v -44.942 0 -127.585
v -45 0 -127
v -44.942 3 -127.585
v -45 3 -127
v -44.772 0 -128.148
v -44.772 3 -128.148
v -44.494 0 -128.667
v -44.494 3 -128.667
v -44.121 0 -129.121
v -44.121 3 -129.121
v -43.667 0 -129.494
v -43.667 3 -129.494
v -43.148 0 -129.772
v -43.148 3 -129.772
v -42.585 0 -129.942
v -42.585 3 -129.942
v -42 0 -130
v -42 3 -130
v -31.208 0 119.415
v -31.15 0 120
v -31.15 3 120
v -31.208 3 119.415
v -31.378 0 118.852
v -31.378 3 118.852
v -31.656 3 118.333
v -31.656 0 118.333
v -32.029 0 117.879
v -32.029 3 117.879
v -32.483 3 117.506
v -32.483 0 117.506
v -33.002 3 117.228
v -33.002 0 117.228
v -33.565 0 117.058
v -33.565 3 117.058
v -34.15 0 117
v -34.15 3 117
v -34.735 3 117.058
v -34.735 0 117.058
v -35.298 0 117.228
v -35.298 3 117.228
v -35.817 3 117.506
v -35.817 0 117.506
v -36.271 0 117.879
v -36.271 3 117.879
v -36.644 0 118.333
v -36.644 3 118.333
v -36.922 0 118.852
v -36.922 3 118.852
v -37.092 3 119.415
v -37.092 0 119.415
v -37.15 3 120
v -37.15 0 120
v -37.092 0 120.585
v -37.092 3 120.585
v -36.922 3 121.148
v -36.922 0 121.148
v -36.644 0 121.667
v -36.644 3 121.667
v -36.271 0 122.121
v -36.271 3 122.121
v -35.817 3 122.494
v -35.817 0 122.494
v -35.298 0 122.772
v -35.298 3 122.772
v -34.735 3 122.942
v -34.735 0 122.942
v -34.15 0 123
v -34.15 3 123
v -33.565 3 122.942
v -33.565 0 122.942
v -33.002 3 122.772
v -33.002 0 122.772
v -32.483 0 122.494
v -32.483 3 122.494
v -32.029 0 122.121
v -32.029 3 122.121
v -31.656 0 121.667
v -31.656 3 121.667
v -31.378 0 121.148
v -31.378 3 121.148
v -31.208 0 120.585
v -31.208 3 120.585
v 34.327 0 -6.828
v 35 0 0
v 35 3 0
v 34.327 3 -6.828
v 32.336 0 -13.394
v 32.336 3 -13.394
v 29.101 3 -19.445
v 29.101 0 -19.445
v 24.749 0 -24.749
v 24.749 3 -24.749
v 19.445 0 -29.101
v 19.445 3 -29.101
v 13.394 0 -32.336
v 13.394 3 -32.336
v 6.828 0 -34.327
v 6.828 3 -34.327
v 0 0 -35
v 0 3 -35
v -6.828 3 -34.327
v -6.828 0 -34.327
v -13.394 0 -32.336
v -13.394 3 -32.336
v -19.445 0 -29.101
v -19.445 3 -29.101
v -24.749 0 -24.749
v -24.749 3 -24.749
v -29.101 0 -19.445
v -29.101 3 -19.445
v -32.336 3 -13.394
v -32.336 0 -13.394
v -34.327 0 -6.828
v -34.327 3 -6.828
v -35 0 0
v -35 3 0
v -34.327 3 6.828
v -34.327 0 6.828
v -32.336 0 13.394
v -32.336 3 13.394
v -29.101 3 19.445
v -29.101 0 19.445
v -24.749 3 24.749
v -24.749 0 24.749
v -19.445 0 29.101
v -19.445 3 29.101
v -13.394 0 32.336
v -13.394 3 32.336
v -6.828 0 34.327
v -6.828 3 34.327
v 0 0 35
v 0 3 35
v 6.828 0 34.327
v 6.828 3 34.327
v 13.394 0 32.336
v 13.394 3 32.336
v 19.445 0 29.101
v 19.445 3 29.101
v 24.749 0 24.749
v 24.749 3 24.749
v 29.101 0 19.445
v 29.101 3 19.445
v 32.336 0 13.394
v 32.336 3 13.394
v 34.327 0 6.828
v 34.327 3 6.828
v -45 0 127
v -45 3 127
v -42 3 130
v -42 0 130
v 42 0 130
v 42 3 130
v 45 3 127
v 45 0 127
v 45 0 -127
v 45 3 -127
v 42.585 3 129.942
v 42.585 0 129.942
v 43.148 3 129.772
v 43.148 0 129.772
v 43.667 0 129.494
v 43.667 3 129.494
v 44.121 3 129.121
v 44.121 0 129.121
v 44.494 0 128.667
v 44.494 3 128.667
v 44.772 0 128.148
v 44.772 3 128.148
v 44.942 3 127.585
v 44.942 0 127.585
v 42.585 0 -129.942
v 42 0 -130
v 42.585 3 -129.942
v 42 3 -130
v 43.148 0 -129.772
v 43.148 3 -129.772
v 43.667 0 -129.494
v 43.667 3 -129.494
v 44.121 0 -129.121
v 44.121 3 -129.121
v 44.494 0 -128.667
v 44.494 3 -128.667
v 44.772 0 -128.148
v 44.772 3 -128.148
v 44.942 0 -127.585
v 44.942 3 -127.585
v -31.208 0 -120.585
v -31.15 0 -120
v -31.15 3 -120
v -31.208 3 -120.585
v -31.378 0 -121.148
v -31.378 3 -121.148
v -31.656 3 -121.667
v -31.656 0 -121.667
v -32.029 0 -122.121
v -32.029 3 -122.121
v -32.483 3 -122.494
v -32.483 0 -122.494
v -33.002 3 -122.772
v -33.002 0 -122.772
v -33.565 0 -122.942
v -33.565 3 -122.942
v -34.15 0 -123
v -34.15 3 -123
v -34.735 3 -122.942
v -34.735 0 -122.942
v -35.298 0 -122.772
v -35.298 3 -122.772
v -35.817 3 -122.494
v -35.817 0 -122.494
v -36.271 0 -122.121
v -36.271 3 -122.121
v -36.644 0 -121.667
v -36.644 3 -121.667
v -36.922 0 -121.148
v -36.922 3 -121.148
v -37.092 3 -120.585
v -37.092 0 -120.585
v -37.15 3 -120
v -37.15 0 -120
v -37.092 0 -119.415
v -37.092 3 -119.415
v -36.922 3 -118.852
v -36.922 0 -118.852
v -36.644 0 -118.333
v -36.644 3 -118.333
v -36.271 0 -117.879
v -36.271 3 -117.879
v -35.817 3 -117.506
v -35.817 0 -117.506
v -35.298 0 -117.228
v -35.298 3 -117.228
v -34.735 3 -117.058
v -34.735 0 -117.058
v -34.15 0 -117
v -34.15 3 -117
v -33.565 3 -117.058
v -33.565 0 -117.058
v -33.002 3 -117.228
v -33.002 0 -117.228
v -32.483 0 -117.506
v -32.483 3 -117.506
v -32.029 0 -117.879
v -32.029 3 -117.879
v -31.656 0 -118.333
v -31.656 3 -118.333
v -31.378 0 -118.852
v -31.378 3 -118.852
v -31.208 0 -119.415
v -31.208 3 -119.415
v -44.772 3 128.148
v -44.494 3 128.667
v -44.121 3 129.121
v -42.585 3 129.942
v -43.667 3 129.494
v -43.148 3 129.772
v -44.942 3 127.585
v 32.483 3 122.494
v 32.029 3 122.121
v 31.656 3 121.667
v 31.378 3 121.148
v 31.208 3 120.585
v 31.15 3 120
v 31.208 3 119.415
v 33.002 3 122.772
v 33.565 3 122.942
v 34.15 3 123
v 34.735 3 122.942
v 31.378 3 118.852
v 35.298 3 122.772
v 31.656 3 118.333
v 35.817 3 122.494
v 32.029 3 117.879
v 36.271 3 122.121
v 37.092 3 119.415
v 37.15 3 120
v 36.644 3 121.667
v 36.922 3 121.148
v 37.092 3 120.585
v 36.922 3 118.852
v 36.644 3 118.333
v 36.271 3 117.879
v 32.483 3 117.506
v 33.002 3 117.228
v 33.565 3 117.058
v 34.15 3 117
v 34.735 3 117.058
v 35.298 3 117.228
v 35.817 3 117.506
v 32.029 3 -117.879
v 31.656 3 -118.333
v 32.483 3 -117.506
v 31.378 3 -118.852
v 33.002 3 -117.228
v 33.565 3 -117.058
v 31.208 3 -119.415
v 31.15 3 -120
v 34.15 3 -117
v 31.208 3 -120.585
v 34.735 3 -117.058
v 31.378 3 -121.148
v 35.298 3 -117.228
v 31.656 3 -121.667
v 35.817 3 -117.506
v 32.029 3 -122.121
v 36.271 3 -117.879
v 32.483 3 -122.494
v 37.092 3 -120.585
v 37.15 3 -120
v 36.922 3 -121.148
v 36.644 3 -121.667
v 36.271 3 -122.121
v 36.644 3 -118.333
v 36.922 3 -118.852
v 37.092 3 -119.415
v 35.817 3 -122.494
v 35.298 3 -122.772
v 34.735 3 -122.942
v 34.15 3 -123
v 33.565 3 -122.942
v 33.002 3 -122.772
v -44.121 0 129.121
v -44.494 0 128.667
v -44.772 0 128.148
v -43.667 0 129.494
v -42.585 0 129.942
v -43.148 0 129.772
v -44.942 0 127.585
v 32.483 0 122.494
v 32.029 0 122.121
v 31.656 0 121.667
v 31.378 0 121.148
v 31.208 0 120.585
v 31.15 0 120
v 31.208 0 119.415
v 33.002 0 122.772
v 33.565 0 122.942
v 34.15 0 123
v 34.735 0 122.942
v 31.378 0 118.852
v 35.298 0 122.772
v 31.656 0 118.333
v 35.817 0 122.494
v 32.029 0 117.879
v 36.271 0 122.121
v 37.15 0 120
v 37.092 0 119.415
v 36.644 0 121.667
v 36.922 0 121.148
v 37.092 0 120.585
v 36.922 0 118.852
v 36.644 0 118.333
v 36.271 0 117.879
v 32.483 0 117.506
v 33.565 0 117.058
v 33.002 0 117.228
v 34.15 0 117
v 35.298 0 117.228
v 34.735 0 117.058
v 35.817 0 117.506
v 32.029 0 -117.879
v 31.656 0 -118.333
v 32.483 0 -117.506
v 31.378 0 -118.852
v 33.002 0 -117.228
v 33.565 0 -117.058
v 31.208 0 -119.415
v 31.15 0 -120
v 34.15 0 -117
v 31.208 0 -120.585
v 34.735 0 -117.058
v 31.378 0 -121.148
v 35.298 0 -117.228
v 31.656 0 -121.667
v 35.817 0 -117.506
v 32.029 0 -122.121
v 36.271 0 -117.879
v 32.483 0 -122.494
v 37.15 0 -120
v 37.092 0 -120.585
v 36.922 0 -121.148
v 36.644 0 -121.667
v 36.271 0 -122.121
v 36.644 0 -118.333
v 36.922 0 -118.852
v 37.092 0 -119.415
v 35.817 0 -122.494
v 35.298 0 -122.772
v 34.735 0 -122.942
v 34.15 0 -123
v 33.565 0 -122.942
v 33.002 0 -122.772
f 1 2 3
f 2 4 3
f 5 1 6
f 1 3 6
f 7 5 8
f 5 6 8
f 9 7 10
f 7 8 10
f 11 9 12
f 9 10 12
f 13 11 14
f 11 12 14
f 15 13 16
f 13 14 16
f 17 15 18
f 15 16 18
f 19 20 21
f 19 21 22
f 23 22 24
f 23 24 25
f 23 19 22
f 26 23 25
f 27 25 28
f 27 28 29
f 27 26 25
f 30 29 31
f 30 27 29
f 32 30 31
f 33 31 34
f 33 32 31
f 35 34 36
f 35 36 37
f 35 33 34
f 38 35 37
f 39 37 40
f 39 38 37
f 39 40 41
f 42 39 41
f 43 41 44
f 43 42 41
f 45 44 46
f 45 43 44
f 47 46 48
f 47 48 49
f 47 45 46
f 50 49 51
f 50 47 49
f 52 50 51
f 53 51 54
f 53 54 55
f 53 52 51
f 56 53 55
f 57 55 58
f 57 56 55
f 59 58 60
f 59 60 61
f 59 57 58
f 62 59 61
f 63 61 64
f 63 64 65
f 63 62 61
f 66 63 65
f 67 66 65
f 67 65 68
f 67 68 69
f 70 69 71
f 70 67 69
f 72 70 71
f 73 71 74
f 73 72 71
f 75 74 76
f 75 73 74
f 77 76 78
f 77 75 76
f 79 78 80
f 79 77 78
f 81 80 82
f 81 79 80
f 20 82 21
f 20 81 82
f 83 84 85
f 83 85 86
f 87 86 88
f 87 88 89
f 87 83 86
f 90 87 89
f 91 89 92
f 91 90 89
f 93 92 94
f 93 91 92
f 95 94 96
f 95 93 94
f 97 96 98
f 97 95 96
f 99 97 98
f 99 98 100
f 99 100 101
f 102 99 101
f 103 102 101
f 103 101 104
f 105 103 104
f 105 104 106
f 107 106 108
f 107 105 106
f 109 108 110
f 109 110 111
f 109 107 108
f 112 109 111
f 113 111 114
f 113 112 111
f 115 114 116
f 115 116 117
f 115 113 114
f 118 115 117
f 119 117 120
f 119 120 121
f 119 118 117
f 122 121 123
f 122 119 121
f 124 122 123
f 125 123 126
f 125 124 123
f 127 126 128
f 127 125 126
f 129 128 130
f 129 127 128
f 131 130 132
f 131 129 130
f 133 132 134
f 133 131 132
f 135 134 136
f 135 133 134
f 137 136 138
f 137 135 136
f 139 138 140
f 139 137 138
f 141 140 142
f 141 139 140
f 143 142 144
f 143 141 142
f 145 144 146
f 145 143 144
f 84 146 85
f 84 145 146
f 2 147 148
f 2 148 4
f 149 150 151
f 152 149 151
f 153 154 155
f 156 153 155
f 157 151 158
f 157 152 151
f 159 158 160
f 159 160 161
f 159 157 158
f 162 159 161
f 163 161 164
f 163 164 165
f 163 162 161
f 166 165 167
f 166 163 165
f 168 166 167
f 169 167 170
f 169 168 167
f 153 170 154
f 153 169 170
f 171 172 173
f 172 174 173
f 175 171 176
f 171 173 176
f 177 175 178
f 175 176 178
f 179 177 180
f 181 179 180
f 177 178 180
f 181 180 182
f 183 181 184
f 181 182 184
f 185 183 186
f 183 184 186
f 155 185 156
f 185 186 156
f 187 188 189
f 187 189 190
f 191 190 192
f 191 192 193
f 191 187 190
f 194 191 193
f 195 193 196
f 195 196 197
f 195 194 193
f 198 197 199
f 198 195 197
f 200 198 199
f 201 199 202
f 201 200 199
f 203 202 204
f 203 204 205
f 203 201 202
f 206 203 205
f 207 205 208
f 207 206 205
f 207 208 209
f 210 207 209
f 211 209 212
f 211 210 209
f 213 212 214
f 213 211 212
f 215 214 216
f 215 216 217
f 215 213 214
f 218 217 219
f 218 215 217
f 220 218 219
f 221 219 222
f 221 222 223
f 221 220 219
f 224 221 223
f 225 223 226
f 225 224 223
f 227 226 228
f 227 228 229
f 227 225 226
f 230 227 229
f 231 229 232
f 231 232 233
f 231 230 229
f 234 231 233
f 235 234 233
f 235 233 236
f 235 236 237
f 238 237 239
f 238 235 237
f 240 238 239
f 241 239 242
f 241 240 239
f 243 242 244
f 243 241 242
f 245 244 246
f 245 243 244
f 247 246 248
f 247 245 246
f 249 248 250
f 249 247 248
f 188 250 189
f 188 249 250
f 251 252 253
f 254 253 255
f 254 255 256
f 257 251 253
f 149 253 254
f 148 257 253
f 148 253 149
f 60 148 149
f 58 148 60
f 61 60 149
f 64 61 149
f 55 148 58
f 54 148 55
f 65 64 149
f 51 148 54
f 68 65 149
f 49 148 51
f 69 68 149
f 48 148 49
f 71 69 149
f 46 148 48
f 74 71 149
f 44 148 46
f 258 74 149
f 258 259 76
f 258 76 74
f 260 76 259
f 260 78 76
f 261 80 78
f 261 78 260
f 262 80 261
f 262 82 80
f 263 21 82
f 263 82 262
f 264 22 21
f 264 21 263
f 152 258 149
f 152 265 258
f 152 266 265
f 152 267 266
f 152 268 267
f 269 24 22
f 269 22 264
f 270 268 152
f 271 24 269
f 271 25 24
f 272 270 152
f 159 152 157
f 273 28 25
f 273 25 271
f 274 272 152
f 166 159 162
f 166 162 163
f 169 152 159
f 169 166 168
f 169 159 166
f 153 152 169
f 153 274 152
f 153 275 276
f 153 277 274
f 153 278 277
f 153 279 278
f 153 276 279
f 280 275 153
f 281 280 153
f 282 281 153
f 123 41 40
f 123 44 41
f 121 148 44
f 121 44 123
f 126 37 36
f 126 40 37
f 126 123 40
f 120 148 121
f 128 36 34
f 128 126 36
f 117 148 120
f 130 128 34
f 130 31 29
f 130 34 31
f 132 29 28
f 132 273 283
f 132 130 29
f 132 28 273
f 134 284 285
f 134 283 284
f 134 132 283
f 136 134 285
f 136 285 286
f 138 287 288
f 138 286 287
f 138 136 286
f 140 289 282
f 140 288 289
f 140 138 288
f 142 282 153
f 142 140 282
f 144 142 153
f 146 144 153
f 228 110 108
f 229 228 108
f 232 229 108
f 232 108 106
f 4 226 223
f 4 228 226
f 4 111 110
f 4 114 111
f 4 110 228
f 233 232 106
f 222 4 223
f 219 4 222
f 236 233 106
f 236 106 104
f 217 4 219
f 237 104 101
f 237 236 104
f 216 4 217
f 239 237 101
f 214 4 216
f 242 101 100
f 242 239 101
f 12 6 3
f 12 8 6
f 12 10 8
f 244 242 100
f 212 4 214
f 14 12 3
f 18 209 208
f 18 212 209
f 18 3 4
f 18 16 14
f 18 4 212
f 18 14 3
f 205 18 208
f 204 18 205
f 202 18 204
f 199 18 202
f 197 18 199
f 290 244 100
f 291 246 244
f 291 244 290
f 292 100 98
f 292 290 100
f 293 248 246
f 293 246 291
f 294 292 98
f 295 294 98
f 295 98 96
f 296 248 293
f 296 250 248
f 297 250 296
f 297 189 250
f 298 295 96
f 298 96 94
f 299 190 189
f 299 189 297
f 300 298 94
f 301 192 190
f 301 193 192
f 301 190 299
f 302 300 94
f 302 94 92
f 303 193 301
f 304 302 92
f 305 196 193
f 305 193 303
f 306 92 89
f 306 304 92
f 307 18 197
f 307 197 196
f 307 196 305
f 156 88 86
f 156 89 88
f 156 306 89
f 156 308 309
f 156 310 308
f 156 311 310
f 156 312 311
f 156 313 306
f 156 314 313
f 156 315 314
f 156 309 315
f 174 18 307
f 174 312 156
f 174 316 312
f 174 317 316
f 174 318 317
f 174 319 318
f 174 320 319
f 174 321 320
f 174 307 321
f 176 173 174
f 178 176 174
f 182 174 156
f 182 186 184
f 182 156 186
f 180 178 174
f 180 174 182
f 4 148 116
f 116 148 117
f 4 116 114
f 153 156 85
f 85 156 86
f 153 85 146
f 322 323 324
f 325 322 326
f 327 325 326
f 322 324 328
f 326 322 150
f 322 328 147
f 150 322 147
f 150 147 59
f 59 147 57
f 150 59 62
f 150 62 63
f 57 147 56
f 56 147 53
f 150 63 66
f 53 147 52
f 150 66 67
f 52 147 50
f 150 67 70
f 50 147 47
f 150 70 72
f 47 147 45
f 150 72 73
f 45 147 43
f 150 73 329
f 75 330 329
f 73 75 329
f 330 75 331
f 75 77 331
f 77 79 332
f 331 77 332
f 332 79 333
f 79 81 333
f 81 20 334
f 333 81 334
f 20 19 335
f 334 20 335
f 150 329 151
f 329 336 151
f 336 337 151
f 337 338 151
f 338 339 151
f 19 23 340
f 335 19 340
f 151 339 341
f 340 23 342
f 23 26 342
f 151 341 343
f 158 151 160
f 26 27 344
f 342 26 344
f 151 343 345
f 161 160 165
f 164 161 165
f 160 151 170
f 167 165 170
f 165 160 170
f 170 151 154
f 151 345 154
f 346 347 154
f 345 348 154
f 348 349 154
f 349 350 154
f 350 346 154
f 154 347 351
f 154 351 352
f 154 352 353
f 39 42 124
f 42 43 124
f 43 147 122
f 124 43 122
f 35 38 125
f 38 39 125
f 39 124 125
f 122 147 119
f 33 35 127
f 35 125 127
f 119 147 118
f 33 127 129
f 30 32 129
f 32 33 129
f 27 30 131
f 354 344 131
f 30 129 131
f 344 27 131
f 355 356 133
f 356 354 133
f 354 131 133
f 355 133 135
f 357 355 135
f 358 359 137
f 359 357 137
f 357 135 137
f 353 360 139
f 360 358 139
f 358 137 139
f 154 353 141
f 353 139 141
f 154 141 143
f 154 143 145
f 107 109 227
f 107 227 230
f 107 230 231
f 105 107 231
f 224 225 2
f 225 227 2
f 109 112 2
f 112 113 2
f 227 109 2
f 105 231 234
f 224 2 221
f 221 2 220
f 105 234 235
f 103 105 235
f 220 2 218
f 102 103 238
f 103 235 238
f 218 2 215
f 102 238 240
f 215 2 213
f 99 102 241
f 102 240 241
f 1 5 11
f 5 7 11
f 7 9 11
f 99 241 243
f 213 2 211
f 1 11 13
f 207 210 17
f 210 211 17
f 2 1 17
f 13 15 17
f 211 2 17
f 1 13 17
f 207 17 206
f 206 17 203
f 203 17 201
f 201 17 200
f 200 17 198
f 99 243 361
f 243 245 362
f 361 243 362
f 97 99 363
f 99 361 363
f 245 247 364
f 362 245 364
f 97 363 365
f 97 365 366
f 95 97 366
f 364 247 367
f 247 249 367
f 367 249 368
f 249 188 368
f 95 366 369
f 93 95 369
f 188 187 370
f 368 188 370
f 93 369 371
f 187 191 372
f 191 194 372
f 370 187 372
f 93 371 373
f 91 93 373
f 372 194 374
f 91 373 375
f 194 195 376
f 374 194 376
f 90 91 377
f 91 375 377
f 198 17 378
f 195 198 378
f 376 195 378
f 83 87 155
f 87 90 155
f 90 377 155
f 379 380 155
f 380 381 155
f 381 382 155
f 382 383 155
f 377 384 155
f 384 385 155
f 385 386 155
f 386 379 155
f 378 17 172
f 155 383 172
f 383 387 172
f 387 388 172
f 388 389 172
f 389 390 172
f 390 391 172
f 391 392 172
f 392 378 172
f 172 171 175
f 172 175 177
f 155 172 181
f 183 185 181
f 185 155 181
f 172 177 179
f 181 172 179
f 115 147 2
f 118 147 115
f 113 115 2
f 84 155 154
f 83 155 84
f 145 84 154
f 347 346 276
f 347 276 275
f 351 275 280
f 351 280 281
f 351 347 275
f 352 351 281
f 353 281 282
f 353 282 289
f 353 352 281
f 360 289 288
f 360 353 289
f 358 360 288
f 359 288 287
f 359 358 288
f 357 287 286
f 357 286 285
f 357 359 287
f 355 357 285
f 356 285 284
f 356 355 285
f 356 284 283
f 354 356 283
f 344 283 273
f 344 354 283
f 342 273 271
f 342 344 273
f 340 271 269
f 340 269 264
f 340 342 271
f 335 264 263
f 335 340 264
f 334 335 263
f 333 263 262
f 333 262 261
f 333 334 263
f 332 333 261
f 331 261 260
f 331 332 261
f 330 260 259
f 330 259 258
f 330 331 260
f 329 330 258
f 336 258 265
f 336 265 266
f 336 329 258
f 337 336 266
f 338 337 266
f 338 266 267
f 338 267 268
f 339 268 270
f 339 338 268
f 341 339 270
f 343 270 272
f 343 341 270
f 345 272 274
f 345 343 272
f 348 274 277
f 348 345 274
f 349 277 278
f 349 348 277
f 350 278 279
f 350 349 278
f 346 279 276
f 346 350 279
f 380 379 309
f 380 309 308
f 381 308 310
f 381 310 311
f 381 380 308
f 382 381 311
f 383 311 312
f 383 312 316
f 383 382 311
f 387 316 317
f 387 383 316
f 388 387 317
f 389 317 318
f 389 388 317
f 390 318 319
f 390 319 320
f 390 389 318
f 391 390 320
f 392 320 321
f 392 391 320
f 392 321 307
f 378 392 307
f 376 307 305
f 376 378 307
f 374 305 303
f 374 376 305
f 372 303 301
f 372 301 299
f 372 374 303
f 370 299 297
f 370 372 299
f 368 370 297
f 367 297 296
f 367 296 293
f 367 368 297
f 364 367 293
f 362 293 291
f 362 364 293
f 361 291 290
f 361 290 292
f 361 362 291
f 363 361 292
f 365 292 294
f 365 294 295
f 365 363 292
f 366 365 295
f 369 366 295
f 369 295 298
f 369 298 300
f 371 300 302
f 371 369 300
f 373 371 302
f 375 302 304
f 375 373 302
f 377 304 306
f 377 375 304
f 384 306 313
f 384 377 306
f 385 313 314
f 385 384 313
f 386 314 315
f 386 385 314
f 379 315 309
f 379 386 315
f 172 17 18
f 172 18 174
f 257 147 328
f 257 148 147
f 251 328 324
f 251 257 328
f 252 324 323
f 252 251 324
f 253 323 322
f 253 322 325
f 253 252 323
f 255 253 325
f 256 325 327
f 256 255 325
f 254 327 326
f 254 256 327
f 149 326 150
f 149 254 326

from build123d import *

# Parameters (mm, degrees)
SKETCH1_W           = 90
SKETCH1_H           = 260
SKETCH1_R           = 35
SKETCH1_R_2         = 3
BOSS_EXTRUDE1_DEPTH = 3
FILLET1_R           = 3


with BuildPart() as part:
    # Sketch1 → Boss-Extrude1 (new body)
    with BuildSketch(Plane(origin=(0, 0, 0), x_dir=(1, 0, 0), z_dir=(0, 1, 0))):
        Rectangle(SKETCH1_W, SKETCH1_H)
        Circle(SKETCH1_R, mode=Mode.SUBTRACT)
        with Locations((-34.15, 120)):
            Circle(SKETCH1_R_2, mode=Mode.SUBTRACT)
        with Locations((34.15, 120)):
            Circle(SKETCH1_R_2, mode=Mode.SUBTRACT)
        with Locations((34.15, -120)):
            Circle(SKETCH1_R_2, mode=Mode.SUBTRACT)
        with Locations((-34.15, -120)):
            Circle(SKETCH1_R_2, mode=Mode.SUBTRACT)
    extrude(amount=BOSS_EXTRUDE1_DEPTH)

    # Fillet1
    fillet1_edges = [part.edges().sort_by_distance(p)[0] for p in [
        (45, 1.5, 130),
        (-45, 1.5, 130),
        (-45, 1.5, -130),
        (45, 1.5, -130),
    ]]
    fillet(fillet1_edges, radius=FILLET1_R)


solid = part.part
